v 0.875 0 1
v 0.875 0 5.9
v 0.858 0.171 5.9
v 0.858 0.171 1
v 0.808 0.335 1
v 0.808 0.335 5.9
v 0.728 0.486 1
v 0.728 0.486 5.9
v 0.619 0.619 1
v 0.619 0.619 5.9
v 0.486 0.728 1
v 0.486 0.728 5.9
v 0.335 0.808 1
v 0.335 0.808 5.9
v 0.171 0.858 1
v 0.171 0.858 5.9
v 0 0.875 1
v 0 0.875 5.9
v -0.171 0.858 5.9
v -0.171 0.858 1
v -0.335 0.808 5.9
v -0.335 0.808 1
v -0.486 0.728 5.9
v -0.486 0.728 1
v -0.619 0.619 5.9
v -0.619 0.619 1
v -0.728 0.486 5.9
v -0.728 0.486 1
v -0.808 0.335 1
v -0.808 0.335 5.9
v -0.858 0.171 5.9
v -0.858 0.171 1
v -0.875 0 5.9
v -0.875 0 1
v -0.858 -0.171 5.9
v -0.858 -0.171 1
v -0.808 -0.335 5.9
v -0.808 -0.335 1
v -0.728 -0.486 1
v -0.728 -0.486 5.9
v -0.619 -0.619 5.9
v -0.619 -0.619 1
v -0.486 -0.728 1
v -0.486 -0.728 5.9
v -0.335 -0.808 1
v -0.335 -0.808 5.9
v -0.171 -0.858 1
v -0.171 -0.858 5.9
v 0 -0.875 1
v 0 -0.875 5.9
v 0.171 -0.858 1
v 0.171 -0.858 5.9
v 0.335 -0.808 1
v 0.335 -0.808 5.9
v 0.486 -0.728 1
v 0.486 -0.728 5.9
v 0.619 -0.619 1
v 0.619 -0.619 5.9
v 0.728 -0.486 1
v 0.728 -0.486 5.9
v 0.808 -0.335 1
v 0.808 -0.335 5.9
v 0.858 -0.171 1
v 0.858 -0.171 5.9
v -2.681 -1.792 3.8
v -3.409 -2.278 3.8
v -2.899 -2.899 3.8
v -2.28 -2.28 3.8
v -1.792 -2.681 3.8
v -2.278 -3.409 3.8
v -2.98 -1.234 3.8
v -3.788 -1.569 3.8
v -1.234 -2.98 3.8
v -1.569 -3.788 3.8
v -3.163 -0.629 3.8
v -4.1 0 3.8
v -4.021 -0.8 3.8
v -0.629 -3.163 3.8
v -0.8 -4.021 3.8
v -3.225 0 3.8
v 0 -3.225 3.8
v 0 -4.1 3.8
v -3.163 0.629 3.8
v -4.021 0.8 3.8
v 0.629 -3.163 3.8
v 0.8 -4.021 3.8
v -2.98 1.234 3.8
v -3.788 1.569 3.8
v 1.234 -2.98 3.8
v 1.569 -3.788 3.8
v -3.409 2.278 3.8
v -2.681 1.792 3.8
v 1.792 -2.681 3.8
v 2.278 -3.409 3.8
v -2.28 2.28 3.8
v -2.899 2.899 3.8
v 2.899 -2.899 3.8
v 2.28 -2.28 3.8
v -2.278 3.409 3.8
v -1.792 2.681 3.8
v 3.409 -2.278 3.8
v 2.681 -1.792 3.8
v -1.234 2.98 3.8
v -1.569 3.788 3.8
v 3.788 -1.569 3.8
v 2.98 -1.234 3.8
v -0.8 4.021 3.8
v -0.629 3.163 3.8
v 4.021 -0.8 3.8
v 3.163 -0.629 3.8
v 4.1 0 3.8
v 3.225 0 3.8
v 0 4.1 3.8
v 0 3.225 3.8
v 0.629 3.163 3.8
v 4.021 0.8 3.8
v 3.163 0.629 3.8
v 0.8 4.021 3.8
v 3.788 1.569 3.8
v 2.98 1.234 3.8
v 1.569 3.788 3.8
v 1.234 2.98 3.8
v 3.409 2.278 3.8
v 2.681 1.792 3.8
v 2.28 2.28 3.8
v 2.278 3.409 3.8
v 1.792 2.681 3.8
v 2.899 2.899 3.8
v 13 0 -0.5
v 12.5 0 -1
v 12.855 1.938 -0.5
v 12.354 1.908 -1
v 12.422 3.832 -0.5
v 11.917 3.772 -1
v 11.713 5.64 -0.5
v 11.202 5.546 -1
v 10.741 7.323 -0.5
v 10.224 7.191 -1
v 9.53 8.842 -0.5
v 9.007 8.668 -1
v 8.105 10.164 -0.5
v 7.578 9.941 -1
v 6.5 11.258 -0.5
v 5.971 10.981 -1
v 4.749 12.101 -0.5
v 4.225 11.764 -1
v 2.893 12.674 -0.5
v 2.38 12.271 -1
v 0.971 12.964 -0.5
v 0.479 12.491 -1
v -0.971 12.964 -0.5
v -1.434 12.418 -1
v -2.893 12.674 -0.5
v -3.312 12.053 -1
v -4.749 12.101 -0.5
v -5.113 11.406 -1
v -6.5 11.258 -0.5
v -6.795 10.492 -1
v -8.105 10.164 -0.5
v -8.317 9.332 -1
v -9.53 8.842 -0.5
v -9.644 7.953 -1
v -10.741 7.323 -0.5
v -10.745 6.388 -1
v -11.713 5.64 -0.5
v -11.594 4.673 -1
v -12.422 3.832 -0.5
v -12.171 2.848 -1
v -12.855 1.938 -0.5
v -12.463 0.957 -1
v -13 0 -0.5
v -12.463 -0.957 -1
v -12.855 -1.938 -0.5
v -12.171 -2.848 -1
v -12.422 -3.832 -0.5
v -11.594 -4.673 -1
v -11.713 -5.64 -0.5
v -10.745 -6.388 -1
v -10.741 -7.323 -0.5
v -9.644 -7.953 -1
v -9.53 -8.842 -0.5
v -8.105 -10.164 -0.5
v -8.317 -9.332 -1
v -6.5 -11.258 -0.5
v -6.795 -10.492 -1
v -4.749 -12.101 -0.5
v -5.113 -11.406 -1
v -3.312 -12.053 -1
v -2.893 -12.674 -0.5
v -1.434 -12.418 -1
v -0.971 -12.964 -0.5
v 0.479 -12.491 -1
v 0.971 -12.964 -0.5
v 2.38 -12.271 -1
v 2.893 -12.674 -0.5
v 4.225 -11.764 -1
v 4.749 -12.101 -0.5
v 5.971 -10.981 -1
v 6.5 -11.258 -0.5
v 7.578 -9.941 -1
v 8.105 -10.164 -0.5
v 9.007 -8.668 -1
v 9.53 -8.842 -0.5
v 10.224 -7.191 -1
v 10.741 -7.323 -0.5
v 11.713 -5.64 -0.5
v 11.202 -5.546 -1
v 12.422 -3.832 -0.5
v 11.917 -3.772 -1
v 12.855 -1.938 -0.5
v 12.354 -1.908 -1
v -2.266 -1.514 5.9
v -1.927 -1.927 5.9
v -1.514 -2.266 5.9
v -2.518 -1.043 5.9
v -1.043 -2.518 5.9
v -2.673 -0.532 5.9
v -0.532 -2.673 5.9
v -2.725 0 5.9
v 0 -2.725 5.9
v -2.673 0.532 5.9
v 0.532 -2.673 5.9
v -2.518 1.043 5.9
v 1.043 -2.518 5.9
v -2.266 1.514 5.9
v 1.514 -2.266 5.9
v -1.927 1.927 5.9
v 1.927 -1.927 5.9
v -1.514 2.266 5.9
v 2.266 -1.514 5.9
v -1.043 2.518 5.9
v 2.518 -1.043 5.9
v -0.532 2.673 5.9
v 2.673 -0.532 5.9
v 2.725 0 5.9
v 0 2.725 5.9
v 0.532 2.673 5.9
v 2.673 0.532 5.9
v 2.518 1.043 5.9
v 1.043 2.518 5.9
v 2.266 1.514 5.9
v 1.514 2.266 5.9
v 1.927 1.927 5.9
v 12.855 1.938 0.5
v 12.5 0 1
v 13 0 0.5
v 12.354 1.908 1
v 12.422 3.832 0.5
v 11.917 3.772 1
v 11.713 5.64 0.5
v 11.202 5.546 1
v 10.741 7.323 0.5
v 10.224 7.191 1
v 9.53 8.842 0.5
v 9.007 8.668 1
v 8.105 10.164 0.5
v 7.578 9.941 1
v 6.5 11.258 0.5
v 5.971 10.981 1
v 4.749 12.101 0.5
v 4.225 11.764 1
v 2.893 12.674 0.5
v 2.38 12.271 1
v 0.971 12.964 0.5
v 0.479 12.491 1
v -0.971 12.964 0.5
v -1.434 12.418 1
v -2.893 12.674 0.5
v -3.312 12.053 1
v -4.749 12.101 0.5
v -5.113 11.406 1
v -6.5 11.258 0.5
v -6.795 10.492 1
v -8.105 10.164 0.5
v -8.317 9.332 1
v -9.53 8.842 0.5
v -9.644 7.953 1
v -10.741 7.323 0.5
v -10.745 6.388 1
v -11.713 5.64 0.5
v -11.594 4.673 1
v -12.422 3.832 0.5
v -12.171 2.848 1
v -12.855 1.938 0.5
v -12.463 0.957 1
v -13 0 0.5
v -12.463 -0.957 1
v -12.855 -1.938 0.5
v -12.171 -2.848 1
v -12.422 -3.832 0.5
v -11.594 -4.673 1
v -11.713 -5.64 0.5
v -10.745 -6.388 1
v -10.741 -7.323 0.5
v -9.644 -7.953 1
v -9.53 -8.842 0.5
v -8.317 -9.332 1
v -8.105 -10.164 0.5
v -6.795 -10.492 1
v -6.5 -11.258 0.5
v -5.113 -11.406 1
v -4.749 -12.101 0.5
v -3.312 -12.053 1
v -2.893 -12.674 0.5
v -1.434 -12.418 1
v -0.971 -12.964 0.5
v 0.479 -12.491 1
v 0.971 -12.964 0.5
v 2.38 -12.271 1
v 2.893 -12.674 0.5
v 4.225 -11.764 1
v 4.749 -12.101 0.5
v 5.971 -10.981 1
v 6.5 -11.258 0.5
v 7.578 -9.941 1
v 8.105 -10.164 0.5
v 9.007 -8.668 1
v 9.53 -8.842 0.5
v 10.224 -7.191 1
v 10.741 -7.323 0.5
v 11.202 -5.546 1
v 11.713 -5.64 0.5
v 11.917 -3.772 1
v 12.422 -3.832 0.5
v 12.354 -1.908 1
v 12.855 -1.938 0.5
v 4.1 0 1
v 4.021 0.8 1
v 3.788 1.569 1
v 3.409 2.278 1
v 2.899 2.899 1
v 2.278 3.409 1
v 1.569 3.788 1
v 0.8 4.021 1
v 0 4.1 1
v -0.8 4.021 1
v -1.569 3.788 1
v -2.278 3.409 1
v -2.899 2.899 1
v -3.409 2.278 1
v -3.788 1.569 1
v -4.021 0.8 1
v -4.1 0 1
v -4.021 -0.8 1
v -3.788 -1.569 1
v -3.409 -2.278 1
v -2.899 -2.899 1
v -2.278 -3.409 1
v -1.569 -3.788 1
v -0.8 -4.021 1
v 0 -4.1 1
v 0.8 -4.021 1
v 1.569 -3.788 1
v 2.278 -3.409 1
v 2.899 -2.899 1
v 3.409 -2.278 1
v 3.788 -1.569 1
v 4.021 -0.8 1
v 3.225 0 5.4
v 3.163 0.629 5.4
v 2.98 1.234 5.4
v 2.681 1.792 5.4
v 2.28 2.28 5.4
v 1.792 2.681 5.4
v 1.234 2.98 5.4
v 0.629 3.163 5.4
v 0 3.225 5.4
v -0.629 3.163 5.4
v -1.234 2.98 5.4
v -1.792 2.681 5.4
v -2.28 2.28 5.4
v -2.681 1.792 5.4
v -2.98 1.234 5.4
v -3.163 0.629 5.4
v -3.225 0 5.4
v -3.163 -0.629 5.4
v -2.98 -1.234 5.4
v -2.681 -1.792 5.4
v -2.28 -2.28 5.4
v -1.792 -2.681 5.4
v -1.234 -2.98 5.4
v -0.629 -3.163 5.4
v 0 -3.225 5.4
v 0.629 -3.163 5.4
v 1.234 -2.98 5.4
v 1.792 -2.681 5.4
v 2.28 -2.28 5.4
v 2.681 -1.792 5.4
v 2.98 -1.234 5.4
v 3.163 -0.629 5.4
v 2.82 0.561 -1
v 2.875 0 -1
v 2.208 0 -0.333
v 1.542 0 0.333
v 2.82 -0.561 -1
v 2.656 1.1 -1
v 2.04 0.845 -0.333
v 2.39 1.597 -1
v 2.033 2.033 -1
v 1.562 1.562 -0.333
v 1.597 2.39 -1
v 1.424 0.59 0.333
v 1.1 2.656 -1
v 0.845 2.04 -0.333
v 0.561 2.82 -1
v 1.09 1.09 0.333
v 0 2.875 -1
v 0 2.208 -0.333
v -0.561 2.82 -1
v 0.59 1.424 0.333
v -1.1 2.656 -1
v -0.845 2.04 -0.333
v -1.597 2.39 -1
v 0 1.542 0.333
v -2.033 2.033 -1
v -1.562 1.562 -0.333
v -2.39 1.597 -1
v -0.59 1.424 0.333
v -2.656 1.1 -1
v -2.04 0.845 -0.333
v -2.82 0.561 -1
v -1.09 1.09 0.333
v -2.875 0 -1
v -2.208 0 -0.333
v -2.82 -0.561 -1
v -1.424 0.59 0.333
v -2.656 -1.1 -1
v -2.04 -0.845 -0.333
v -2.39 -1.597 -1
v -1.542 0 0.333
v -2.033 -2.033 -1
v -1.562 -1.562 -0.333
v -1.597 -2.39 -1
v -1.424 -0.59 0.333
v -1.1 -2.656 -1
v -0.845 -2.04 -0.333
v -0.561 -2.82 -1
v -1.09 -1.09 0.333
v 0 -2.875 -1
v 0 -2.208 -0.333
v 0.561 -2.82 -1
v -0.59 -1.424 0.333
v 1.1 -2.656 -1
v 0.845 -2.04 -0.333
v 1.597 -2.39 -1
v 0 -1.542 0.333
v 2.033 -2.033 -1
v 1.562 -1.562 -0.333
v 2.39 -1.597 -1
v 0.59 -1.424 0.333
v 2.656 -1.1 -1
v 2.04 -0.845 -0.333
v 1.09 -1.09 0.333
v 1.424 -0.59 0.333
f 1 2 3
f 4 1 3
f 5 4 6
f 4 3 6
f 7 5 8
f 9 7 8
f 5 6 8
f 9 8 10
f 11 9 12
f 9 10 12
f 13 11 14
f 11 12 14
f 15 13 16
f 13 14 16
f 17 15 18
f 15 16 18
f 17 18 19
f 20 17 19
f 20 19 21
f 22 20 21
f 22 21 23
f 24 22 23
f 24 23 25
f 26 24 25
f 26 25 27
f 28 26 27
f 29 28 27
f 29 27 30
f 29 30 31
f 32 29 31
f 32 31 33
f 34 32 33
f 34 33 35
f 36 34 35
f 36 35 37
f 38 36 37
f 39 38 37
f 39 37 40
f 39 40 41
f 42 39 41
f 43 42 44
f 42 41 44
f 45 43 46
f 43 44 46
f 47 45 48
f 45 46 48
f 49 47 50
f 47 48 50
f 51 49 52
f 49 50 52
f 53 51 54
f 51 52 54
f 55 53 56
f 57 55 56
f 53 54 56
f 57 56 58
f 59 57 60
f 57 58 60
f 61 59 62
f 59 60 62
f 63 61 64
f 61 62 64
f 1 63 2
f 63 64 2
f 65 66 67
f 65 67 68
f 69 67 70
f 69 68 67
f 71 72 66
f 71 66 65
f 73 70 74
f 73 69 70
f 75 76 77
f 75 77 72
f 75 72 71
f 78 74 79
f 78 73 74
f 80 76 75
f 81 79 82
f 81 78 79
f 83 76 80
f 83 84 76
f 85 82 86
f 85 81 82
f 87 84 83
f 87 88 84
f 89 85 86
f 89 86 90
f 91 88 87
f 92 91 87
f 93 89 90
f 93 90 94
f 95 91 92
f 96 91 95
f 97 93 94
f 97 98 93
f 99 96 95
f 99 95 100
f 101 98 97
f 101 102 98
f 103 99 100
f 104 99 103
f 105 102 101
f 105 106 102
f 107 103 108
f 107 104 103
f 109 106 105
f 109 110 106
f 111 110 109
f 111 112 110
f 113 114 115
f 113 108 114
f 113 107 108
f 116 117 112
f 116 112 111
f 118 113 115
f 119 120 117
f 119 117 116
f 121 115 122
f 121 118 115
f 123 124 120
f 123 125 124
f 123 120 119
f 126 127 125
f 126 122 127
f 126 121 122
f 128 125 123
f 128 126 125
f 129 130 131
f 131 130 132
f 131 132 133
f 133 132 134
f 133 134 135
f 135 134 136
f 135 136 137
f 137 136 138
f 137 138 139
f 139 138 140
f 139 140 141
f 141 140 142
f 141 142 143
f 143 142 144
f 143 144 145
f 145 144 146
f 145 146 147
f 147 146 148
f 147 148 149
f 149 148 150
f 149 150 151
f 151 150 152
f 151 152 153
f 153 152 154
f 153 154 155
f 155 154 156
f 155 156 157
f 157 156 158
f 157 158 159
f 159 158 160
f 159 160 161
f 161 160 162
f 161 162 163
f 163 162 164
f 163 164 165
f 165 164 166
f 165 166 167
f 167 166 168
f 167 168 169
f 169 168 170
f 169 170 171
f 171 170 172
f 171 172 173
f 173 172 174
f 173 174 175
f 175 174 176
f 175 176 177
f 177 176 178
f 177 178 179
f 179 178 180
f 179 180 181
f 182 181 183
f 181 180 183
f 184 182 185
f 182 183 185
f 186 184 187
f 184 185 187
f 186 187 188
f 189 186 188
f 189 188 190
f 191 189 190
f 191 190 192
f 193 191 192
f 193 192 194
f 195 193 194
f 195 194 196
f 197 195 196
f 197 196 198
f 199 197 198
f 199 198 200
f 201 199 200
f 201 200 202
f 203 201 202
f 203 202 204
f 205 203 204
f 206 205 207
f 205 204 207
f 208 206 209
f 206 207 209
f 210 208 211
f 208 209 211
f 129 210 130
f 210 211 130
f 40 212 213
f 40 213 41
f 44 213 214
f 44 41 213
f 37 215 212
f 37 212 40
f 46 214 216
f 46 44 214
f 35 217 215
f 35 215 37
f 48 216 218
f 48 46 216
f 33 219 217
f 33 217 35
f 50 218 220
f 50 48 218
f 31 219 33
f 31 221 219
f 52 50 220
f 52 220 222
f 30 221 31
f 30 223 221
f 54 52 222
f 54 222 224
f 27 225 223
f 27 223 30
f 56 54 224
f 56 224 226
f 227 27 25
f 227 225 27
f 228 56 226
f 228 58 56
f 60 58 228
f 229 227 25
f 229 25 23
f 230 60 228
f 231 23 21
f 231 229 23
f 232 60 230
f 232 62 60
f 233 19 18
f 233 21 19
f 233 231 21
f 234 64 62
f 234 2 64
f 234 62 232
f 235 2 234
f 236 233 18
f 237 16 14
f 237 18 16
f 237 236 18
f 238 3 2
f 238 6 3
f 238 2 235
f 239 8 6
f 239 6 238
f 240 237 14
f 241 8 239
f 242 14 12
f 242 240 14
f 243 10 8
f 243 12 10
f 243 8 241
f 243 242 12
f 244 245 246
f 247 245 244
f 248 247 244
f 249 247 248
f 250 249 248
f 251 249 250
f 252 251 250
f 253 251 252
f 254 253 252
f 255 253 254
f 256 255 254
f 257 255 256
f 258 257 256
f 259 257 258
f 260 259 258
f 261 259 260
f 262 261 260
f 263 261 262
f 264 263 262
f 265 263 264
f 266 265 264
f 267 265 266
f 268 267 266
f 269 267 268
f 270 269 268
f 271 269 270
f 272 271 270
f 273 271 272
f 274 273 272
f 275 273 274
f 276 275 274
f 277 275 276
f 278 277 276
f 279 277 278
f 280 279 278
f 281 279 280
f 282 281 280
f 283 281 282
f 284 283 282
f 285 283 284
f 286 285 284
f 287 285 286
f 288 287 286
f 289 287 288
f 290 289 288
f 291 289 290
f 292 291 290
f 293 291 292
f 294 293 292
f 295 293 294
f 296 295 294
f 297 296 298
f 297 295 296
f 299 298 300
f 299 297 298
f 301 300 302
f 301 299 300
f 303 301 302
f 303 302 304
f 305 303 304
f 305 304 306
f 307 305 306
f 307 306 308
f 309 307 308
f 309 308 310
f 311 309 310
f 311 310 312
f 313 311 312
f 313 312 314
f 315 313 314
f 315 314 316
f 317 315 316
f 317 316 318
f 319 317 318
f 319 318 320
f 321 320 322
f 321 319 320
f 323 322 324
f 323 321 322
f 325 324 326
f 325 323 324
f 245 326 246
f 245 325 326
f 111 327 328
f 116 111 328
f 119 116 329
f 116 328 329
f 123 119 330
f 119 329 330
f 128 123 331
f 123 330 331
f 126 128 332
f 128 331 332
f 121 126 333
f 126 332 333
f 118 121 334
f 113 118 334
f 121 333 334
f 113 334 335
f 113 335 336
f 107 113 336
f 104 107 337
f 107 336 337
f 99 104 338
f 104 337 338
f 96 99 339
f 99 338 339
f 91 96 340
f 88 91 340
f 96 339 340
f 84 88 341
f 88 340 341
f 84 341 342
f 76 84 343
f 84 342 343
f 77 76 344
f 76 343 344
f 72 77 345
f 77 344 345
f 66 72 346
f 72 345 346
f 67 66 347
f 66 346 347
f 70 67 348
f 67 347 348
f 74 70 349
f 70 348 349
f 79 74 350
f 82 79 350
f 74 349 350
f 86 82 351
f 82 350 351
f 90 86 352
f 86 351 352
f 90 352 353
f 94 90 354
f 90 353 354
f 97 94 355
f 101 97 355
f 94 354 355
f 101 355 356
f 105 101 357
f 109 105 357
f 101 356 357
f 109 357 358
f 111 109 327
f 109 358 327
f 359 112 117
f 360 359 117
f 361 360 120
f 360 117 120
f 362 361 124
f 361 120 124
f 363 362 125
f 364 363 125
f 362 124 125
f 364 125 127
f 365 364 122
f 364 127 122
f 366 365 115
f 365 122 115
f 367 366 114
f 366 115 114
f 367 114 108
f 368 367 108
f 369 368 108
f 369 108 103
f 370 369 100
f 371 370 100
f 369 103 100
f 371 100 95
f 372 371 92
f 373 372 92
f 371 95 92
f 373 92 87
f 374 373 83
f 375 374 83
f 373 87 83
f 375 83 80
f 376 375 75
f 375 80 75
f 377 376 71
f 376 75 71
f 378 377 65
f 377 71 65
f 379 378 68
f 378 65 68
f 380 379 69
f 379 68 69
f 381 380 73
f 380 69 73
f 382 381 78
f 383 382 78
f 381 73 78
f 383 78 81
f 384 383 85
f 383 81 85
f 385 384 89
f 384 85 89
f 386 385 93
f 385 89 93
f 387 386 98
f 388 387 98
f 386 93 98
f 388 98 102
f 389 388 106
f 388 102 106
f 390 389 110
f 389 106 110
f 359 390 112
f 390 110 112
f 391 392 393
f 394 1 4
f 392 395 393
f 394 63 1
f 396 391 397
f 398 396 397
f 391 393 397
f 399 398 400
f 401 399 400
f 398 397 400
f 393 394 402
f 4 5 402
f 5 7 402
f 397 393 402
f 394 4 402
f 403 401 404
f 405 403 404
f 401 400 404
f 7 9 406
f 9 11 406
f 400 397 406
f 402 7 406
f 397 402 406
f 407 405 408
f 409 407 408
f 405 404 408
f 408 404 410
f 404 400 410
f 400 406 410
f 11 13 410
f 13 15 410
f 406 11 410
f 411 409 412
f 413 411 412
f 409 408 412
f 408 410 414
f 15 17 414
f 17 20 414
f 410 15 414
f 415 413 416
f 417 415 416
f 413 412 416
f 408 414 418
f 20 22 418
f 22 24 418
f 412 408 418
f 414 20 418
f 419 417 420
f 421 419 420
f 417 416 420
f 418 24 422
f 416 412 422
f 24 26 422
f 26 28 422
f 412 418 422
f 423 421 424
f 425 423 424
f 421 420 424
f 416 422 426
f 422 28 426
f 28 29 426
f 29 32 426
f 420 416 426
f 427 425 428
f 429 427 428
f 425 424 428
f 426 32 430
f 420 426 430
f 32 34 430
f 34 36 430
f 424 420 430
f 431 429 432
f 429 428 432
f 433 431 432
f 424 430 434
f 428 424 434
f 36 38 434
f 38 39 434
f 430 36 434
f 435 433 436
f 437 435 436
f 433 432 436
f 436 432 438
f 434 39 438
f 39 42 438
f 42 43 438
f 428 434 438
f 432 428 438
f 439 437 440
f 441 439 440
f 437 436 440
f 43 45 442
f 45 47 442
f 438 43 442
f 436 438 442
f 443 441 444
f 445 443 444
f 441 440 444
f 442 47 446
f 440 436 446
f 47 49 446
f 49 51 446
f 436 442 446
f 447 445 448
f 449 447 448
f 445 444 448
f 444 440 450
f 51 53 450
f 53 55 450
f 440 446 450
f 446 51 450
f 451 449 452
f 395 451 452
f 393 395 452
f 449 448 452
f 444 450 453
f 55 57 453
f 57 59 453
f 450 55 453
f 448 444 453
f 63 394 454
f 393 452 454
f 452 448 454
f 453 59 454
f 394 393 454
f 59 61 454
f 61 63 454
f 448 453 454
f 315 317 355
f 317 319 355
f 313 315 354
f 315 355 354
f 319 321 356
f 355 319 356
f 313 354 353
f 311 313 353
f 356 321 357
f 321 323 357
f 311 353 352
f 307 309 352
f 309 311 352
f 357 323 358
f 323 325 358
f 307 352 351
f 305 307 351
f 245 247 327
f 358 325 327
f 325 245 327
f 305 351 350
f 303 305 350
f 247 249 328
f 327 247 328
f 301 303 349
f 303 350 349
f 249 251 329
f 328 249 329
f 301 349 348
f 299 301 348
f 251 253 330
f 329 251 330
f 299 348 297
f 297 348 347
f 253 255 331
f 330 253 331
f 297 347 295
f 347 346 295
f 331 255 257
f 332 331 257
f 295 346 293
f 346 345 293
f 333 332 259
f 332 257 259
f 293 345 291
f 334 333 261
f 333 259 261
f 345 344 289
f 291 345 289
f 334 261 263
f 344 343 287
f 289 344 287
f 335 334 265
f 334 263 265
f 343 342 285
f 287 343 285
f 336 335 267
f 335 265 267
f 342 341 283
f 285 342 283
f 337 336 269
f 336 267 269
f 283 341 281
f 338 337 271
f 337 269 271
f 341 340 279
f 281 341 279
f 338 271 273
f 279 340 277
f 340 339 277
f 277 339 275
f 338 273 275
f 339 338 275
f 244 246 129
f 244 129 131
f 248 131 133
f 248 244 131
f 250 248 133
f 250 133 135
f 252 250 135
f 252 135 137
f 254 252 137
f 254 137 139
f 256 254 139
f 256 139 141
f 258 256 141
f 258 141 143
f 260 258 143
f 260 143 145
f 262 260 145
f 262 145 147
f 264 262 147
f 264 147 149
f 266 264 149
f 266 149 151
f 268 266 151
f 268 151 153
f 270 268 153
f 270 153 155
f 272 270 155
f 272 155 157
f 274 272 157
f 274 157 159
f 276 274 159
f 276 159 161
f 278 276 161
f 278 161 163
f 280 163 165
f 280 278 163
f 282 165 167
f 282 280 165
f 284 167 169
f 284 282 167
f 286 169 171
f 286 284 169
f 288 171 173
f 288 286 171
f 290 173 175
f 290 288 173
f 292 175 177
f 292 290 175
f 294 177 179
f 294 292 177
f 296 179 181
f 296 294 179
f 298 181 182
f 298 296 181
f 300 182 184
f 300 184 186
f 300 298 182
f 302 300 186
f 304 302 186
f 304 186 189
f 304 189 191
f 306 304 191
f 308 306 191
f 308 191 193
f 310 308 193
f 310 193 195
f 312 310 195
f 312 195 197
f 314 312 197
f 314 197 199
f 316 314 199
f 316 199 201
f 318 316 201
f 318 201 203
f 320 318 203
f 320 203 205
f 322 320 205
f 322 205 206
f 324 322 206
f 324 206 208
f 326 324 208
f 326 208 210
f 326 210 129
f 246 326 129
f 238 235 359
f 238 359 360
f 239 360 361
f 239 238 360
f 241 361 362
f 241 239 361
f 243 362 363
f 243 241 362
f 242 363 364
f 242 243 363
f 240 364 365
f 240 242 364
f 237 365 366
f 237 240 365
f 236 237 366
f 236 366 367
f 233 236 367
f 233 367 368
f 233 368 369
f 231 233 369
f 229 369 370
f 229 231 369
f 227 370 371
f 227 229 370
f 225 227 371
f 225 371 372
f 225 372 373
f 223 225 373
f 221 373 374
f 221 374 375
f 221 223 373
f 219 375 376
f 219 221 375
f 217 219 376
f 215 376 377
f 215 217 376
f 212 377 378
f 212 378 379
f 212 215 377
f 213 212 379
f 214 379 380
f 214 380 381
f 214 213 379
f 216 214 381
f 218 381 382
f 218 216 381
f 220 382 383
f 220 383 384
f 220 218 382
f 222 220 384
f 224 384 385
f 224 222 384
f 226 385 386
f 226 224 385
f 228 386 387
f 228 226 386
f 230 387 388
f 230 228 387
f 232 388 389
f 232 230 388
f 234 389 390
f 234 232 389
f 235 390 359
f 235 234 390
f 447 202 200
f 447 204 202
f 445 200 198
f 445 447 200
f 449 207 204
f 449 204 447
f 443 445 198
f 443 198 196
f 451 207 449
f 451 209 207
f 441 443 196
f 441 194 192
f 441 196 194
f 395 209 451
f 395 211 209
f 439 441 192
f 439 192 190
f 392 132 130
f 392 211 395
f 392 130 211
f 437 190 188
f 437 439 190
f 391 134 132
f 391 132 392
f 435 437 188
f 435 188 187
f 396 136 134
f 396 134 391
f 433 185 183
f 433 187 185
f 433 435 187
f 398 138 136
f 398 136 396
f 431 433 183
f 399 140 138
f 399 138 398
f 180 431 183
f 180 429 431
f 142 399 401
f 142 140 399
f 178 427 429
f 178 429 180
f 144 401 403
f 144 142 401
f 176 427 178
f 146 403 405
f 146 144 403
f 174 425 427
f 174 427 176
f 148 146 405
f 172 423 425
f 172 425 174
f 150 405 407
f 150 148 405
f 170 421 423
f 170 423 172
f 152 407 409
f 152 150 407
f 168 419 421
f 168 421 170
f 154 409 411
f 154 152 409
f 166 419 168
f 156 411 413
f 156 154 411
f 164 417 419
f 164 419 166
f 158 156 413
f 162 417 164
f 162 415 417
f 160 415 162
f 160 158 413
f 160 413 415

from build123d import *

# Parameters (mm, degrees)
F0_W     = 13
F0_H     = 1
F2_R     = 4.1
F3_DEPTH = 2.8
F4_R     = 3.225
F5_DEPTH = 2.1
F6_R     = 0.875
F7_DEPTH = 5.901
F8_DEPTH = 1
F9_SIZE  = 0.5
F10_SIZE = 2


with BuildPart() as f1:
    # F0 (on Front) → F1 (revolve)
    with BuildSketch(Plane.XZ):
        with Locations((6.5, 0.5)):
            Rectangle(F0_W, F0_H)
    revolve(axis=Axis((0, 0, 1.7087265151), (0, 0, 1)))

    # F2 (on face) → F3 (join)
    with BuildSketch(Plane.XY.offset(1)):
        Circle(F2_R)
    extrude(amount=F3_DEPTH)

    # F4 (on face) → F5 (join)
    with BuildSketch(Plane.XY.offset(3.8)):
        Circle(F4_R)
    extrude(amount=F5_DEPTH)

    # F6 (on face) → F7 (cut, through all)
    with BuildSketch(Plane.XY.offset(5.9)):
        Circle(F6_R)
    extrude(amount=-F7_DEPTH, mode=Mode.SUBTRACT)

    # F8 (add): a face of the model
    f8_faces = [f1.faces().sort_by_distance(p)[0] for p in [
        (-12.6323044738, 0, 0),
    ]]
    extrude(f8_faces, amount=F8_DEPTH)

    # F9
    f9_edges = [f1.edges().sort_by_distance(p)[0] for p in [
        (-13, 0, -1),
        (-13, 0, 1),
        (-3.225, 0, 5.9),
    ]]
    chamfer(f9_edges, length=F9_SIZE)

    # F10
    f10_edges = [f1.edges().sort_by_distance(p)[0] for p in [
        (-0.875, 0, -1),
    ]]
    chamfer(f10_edges, length=F10_SIZE)


solid = f1.part
